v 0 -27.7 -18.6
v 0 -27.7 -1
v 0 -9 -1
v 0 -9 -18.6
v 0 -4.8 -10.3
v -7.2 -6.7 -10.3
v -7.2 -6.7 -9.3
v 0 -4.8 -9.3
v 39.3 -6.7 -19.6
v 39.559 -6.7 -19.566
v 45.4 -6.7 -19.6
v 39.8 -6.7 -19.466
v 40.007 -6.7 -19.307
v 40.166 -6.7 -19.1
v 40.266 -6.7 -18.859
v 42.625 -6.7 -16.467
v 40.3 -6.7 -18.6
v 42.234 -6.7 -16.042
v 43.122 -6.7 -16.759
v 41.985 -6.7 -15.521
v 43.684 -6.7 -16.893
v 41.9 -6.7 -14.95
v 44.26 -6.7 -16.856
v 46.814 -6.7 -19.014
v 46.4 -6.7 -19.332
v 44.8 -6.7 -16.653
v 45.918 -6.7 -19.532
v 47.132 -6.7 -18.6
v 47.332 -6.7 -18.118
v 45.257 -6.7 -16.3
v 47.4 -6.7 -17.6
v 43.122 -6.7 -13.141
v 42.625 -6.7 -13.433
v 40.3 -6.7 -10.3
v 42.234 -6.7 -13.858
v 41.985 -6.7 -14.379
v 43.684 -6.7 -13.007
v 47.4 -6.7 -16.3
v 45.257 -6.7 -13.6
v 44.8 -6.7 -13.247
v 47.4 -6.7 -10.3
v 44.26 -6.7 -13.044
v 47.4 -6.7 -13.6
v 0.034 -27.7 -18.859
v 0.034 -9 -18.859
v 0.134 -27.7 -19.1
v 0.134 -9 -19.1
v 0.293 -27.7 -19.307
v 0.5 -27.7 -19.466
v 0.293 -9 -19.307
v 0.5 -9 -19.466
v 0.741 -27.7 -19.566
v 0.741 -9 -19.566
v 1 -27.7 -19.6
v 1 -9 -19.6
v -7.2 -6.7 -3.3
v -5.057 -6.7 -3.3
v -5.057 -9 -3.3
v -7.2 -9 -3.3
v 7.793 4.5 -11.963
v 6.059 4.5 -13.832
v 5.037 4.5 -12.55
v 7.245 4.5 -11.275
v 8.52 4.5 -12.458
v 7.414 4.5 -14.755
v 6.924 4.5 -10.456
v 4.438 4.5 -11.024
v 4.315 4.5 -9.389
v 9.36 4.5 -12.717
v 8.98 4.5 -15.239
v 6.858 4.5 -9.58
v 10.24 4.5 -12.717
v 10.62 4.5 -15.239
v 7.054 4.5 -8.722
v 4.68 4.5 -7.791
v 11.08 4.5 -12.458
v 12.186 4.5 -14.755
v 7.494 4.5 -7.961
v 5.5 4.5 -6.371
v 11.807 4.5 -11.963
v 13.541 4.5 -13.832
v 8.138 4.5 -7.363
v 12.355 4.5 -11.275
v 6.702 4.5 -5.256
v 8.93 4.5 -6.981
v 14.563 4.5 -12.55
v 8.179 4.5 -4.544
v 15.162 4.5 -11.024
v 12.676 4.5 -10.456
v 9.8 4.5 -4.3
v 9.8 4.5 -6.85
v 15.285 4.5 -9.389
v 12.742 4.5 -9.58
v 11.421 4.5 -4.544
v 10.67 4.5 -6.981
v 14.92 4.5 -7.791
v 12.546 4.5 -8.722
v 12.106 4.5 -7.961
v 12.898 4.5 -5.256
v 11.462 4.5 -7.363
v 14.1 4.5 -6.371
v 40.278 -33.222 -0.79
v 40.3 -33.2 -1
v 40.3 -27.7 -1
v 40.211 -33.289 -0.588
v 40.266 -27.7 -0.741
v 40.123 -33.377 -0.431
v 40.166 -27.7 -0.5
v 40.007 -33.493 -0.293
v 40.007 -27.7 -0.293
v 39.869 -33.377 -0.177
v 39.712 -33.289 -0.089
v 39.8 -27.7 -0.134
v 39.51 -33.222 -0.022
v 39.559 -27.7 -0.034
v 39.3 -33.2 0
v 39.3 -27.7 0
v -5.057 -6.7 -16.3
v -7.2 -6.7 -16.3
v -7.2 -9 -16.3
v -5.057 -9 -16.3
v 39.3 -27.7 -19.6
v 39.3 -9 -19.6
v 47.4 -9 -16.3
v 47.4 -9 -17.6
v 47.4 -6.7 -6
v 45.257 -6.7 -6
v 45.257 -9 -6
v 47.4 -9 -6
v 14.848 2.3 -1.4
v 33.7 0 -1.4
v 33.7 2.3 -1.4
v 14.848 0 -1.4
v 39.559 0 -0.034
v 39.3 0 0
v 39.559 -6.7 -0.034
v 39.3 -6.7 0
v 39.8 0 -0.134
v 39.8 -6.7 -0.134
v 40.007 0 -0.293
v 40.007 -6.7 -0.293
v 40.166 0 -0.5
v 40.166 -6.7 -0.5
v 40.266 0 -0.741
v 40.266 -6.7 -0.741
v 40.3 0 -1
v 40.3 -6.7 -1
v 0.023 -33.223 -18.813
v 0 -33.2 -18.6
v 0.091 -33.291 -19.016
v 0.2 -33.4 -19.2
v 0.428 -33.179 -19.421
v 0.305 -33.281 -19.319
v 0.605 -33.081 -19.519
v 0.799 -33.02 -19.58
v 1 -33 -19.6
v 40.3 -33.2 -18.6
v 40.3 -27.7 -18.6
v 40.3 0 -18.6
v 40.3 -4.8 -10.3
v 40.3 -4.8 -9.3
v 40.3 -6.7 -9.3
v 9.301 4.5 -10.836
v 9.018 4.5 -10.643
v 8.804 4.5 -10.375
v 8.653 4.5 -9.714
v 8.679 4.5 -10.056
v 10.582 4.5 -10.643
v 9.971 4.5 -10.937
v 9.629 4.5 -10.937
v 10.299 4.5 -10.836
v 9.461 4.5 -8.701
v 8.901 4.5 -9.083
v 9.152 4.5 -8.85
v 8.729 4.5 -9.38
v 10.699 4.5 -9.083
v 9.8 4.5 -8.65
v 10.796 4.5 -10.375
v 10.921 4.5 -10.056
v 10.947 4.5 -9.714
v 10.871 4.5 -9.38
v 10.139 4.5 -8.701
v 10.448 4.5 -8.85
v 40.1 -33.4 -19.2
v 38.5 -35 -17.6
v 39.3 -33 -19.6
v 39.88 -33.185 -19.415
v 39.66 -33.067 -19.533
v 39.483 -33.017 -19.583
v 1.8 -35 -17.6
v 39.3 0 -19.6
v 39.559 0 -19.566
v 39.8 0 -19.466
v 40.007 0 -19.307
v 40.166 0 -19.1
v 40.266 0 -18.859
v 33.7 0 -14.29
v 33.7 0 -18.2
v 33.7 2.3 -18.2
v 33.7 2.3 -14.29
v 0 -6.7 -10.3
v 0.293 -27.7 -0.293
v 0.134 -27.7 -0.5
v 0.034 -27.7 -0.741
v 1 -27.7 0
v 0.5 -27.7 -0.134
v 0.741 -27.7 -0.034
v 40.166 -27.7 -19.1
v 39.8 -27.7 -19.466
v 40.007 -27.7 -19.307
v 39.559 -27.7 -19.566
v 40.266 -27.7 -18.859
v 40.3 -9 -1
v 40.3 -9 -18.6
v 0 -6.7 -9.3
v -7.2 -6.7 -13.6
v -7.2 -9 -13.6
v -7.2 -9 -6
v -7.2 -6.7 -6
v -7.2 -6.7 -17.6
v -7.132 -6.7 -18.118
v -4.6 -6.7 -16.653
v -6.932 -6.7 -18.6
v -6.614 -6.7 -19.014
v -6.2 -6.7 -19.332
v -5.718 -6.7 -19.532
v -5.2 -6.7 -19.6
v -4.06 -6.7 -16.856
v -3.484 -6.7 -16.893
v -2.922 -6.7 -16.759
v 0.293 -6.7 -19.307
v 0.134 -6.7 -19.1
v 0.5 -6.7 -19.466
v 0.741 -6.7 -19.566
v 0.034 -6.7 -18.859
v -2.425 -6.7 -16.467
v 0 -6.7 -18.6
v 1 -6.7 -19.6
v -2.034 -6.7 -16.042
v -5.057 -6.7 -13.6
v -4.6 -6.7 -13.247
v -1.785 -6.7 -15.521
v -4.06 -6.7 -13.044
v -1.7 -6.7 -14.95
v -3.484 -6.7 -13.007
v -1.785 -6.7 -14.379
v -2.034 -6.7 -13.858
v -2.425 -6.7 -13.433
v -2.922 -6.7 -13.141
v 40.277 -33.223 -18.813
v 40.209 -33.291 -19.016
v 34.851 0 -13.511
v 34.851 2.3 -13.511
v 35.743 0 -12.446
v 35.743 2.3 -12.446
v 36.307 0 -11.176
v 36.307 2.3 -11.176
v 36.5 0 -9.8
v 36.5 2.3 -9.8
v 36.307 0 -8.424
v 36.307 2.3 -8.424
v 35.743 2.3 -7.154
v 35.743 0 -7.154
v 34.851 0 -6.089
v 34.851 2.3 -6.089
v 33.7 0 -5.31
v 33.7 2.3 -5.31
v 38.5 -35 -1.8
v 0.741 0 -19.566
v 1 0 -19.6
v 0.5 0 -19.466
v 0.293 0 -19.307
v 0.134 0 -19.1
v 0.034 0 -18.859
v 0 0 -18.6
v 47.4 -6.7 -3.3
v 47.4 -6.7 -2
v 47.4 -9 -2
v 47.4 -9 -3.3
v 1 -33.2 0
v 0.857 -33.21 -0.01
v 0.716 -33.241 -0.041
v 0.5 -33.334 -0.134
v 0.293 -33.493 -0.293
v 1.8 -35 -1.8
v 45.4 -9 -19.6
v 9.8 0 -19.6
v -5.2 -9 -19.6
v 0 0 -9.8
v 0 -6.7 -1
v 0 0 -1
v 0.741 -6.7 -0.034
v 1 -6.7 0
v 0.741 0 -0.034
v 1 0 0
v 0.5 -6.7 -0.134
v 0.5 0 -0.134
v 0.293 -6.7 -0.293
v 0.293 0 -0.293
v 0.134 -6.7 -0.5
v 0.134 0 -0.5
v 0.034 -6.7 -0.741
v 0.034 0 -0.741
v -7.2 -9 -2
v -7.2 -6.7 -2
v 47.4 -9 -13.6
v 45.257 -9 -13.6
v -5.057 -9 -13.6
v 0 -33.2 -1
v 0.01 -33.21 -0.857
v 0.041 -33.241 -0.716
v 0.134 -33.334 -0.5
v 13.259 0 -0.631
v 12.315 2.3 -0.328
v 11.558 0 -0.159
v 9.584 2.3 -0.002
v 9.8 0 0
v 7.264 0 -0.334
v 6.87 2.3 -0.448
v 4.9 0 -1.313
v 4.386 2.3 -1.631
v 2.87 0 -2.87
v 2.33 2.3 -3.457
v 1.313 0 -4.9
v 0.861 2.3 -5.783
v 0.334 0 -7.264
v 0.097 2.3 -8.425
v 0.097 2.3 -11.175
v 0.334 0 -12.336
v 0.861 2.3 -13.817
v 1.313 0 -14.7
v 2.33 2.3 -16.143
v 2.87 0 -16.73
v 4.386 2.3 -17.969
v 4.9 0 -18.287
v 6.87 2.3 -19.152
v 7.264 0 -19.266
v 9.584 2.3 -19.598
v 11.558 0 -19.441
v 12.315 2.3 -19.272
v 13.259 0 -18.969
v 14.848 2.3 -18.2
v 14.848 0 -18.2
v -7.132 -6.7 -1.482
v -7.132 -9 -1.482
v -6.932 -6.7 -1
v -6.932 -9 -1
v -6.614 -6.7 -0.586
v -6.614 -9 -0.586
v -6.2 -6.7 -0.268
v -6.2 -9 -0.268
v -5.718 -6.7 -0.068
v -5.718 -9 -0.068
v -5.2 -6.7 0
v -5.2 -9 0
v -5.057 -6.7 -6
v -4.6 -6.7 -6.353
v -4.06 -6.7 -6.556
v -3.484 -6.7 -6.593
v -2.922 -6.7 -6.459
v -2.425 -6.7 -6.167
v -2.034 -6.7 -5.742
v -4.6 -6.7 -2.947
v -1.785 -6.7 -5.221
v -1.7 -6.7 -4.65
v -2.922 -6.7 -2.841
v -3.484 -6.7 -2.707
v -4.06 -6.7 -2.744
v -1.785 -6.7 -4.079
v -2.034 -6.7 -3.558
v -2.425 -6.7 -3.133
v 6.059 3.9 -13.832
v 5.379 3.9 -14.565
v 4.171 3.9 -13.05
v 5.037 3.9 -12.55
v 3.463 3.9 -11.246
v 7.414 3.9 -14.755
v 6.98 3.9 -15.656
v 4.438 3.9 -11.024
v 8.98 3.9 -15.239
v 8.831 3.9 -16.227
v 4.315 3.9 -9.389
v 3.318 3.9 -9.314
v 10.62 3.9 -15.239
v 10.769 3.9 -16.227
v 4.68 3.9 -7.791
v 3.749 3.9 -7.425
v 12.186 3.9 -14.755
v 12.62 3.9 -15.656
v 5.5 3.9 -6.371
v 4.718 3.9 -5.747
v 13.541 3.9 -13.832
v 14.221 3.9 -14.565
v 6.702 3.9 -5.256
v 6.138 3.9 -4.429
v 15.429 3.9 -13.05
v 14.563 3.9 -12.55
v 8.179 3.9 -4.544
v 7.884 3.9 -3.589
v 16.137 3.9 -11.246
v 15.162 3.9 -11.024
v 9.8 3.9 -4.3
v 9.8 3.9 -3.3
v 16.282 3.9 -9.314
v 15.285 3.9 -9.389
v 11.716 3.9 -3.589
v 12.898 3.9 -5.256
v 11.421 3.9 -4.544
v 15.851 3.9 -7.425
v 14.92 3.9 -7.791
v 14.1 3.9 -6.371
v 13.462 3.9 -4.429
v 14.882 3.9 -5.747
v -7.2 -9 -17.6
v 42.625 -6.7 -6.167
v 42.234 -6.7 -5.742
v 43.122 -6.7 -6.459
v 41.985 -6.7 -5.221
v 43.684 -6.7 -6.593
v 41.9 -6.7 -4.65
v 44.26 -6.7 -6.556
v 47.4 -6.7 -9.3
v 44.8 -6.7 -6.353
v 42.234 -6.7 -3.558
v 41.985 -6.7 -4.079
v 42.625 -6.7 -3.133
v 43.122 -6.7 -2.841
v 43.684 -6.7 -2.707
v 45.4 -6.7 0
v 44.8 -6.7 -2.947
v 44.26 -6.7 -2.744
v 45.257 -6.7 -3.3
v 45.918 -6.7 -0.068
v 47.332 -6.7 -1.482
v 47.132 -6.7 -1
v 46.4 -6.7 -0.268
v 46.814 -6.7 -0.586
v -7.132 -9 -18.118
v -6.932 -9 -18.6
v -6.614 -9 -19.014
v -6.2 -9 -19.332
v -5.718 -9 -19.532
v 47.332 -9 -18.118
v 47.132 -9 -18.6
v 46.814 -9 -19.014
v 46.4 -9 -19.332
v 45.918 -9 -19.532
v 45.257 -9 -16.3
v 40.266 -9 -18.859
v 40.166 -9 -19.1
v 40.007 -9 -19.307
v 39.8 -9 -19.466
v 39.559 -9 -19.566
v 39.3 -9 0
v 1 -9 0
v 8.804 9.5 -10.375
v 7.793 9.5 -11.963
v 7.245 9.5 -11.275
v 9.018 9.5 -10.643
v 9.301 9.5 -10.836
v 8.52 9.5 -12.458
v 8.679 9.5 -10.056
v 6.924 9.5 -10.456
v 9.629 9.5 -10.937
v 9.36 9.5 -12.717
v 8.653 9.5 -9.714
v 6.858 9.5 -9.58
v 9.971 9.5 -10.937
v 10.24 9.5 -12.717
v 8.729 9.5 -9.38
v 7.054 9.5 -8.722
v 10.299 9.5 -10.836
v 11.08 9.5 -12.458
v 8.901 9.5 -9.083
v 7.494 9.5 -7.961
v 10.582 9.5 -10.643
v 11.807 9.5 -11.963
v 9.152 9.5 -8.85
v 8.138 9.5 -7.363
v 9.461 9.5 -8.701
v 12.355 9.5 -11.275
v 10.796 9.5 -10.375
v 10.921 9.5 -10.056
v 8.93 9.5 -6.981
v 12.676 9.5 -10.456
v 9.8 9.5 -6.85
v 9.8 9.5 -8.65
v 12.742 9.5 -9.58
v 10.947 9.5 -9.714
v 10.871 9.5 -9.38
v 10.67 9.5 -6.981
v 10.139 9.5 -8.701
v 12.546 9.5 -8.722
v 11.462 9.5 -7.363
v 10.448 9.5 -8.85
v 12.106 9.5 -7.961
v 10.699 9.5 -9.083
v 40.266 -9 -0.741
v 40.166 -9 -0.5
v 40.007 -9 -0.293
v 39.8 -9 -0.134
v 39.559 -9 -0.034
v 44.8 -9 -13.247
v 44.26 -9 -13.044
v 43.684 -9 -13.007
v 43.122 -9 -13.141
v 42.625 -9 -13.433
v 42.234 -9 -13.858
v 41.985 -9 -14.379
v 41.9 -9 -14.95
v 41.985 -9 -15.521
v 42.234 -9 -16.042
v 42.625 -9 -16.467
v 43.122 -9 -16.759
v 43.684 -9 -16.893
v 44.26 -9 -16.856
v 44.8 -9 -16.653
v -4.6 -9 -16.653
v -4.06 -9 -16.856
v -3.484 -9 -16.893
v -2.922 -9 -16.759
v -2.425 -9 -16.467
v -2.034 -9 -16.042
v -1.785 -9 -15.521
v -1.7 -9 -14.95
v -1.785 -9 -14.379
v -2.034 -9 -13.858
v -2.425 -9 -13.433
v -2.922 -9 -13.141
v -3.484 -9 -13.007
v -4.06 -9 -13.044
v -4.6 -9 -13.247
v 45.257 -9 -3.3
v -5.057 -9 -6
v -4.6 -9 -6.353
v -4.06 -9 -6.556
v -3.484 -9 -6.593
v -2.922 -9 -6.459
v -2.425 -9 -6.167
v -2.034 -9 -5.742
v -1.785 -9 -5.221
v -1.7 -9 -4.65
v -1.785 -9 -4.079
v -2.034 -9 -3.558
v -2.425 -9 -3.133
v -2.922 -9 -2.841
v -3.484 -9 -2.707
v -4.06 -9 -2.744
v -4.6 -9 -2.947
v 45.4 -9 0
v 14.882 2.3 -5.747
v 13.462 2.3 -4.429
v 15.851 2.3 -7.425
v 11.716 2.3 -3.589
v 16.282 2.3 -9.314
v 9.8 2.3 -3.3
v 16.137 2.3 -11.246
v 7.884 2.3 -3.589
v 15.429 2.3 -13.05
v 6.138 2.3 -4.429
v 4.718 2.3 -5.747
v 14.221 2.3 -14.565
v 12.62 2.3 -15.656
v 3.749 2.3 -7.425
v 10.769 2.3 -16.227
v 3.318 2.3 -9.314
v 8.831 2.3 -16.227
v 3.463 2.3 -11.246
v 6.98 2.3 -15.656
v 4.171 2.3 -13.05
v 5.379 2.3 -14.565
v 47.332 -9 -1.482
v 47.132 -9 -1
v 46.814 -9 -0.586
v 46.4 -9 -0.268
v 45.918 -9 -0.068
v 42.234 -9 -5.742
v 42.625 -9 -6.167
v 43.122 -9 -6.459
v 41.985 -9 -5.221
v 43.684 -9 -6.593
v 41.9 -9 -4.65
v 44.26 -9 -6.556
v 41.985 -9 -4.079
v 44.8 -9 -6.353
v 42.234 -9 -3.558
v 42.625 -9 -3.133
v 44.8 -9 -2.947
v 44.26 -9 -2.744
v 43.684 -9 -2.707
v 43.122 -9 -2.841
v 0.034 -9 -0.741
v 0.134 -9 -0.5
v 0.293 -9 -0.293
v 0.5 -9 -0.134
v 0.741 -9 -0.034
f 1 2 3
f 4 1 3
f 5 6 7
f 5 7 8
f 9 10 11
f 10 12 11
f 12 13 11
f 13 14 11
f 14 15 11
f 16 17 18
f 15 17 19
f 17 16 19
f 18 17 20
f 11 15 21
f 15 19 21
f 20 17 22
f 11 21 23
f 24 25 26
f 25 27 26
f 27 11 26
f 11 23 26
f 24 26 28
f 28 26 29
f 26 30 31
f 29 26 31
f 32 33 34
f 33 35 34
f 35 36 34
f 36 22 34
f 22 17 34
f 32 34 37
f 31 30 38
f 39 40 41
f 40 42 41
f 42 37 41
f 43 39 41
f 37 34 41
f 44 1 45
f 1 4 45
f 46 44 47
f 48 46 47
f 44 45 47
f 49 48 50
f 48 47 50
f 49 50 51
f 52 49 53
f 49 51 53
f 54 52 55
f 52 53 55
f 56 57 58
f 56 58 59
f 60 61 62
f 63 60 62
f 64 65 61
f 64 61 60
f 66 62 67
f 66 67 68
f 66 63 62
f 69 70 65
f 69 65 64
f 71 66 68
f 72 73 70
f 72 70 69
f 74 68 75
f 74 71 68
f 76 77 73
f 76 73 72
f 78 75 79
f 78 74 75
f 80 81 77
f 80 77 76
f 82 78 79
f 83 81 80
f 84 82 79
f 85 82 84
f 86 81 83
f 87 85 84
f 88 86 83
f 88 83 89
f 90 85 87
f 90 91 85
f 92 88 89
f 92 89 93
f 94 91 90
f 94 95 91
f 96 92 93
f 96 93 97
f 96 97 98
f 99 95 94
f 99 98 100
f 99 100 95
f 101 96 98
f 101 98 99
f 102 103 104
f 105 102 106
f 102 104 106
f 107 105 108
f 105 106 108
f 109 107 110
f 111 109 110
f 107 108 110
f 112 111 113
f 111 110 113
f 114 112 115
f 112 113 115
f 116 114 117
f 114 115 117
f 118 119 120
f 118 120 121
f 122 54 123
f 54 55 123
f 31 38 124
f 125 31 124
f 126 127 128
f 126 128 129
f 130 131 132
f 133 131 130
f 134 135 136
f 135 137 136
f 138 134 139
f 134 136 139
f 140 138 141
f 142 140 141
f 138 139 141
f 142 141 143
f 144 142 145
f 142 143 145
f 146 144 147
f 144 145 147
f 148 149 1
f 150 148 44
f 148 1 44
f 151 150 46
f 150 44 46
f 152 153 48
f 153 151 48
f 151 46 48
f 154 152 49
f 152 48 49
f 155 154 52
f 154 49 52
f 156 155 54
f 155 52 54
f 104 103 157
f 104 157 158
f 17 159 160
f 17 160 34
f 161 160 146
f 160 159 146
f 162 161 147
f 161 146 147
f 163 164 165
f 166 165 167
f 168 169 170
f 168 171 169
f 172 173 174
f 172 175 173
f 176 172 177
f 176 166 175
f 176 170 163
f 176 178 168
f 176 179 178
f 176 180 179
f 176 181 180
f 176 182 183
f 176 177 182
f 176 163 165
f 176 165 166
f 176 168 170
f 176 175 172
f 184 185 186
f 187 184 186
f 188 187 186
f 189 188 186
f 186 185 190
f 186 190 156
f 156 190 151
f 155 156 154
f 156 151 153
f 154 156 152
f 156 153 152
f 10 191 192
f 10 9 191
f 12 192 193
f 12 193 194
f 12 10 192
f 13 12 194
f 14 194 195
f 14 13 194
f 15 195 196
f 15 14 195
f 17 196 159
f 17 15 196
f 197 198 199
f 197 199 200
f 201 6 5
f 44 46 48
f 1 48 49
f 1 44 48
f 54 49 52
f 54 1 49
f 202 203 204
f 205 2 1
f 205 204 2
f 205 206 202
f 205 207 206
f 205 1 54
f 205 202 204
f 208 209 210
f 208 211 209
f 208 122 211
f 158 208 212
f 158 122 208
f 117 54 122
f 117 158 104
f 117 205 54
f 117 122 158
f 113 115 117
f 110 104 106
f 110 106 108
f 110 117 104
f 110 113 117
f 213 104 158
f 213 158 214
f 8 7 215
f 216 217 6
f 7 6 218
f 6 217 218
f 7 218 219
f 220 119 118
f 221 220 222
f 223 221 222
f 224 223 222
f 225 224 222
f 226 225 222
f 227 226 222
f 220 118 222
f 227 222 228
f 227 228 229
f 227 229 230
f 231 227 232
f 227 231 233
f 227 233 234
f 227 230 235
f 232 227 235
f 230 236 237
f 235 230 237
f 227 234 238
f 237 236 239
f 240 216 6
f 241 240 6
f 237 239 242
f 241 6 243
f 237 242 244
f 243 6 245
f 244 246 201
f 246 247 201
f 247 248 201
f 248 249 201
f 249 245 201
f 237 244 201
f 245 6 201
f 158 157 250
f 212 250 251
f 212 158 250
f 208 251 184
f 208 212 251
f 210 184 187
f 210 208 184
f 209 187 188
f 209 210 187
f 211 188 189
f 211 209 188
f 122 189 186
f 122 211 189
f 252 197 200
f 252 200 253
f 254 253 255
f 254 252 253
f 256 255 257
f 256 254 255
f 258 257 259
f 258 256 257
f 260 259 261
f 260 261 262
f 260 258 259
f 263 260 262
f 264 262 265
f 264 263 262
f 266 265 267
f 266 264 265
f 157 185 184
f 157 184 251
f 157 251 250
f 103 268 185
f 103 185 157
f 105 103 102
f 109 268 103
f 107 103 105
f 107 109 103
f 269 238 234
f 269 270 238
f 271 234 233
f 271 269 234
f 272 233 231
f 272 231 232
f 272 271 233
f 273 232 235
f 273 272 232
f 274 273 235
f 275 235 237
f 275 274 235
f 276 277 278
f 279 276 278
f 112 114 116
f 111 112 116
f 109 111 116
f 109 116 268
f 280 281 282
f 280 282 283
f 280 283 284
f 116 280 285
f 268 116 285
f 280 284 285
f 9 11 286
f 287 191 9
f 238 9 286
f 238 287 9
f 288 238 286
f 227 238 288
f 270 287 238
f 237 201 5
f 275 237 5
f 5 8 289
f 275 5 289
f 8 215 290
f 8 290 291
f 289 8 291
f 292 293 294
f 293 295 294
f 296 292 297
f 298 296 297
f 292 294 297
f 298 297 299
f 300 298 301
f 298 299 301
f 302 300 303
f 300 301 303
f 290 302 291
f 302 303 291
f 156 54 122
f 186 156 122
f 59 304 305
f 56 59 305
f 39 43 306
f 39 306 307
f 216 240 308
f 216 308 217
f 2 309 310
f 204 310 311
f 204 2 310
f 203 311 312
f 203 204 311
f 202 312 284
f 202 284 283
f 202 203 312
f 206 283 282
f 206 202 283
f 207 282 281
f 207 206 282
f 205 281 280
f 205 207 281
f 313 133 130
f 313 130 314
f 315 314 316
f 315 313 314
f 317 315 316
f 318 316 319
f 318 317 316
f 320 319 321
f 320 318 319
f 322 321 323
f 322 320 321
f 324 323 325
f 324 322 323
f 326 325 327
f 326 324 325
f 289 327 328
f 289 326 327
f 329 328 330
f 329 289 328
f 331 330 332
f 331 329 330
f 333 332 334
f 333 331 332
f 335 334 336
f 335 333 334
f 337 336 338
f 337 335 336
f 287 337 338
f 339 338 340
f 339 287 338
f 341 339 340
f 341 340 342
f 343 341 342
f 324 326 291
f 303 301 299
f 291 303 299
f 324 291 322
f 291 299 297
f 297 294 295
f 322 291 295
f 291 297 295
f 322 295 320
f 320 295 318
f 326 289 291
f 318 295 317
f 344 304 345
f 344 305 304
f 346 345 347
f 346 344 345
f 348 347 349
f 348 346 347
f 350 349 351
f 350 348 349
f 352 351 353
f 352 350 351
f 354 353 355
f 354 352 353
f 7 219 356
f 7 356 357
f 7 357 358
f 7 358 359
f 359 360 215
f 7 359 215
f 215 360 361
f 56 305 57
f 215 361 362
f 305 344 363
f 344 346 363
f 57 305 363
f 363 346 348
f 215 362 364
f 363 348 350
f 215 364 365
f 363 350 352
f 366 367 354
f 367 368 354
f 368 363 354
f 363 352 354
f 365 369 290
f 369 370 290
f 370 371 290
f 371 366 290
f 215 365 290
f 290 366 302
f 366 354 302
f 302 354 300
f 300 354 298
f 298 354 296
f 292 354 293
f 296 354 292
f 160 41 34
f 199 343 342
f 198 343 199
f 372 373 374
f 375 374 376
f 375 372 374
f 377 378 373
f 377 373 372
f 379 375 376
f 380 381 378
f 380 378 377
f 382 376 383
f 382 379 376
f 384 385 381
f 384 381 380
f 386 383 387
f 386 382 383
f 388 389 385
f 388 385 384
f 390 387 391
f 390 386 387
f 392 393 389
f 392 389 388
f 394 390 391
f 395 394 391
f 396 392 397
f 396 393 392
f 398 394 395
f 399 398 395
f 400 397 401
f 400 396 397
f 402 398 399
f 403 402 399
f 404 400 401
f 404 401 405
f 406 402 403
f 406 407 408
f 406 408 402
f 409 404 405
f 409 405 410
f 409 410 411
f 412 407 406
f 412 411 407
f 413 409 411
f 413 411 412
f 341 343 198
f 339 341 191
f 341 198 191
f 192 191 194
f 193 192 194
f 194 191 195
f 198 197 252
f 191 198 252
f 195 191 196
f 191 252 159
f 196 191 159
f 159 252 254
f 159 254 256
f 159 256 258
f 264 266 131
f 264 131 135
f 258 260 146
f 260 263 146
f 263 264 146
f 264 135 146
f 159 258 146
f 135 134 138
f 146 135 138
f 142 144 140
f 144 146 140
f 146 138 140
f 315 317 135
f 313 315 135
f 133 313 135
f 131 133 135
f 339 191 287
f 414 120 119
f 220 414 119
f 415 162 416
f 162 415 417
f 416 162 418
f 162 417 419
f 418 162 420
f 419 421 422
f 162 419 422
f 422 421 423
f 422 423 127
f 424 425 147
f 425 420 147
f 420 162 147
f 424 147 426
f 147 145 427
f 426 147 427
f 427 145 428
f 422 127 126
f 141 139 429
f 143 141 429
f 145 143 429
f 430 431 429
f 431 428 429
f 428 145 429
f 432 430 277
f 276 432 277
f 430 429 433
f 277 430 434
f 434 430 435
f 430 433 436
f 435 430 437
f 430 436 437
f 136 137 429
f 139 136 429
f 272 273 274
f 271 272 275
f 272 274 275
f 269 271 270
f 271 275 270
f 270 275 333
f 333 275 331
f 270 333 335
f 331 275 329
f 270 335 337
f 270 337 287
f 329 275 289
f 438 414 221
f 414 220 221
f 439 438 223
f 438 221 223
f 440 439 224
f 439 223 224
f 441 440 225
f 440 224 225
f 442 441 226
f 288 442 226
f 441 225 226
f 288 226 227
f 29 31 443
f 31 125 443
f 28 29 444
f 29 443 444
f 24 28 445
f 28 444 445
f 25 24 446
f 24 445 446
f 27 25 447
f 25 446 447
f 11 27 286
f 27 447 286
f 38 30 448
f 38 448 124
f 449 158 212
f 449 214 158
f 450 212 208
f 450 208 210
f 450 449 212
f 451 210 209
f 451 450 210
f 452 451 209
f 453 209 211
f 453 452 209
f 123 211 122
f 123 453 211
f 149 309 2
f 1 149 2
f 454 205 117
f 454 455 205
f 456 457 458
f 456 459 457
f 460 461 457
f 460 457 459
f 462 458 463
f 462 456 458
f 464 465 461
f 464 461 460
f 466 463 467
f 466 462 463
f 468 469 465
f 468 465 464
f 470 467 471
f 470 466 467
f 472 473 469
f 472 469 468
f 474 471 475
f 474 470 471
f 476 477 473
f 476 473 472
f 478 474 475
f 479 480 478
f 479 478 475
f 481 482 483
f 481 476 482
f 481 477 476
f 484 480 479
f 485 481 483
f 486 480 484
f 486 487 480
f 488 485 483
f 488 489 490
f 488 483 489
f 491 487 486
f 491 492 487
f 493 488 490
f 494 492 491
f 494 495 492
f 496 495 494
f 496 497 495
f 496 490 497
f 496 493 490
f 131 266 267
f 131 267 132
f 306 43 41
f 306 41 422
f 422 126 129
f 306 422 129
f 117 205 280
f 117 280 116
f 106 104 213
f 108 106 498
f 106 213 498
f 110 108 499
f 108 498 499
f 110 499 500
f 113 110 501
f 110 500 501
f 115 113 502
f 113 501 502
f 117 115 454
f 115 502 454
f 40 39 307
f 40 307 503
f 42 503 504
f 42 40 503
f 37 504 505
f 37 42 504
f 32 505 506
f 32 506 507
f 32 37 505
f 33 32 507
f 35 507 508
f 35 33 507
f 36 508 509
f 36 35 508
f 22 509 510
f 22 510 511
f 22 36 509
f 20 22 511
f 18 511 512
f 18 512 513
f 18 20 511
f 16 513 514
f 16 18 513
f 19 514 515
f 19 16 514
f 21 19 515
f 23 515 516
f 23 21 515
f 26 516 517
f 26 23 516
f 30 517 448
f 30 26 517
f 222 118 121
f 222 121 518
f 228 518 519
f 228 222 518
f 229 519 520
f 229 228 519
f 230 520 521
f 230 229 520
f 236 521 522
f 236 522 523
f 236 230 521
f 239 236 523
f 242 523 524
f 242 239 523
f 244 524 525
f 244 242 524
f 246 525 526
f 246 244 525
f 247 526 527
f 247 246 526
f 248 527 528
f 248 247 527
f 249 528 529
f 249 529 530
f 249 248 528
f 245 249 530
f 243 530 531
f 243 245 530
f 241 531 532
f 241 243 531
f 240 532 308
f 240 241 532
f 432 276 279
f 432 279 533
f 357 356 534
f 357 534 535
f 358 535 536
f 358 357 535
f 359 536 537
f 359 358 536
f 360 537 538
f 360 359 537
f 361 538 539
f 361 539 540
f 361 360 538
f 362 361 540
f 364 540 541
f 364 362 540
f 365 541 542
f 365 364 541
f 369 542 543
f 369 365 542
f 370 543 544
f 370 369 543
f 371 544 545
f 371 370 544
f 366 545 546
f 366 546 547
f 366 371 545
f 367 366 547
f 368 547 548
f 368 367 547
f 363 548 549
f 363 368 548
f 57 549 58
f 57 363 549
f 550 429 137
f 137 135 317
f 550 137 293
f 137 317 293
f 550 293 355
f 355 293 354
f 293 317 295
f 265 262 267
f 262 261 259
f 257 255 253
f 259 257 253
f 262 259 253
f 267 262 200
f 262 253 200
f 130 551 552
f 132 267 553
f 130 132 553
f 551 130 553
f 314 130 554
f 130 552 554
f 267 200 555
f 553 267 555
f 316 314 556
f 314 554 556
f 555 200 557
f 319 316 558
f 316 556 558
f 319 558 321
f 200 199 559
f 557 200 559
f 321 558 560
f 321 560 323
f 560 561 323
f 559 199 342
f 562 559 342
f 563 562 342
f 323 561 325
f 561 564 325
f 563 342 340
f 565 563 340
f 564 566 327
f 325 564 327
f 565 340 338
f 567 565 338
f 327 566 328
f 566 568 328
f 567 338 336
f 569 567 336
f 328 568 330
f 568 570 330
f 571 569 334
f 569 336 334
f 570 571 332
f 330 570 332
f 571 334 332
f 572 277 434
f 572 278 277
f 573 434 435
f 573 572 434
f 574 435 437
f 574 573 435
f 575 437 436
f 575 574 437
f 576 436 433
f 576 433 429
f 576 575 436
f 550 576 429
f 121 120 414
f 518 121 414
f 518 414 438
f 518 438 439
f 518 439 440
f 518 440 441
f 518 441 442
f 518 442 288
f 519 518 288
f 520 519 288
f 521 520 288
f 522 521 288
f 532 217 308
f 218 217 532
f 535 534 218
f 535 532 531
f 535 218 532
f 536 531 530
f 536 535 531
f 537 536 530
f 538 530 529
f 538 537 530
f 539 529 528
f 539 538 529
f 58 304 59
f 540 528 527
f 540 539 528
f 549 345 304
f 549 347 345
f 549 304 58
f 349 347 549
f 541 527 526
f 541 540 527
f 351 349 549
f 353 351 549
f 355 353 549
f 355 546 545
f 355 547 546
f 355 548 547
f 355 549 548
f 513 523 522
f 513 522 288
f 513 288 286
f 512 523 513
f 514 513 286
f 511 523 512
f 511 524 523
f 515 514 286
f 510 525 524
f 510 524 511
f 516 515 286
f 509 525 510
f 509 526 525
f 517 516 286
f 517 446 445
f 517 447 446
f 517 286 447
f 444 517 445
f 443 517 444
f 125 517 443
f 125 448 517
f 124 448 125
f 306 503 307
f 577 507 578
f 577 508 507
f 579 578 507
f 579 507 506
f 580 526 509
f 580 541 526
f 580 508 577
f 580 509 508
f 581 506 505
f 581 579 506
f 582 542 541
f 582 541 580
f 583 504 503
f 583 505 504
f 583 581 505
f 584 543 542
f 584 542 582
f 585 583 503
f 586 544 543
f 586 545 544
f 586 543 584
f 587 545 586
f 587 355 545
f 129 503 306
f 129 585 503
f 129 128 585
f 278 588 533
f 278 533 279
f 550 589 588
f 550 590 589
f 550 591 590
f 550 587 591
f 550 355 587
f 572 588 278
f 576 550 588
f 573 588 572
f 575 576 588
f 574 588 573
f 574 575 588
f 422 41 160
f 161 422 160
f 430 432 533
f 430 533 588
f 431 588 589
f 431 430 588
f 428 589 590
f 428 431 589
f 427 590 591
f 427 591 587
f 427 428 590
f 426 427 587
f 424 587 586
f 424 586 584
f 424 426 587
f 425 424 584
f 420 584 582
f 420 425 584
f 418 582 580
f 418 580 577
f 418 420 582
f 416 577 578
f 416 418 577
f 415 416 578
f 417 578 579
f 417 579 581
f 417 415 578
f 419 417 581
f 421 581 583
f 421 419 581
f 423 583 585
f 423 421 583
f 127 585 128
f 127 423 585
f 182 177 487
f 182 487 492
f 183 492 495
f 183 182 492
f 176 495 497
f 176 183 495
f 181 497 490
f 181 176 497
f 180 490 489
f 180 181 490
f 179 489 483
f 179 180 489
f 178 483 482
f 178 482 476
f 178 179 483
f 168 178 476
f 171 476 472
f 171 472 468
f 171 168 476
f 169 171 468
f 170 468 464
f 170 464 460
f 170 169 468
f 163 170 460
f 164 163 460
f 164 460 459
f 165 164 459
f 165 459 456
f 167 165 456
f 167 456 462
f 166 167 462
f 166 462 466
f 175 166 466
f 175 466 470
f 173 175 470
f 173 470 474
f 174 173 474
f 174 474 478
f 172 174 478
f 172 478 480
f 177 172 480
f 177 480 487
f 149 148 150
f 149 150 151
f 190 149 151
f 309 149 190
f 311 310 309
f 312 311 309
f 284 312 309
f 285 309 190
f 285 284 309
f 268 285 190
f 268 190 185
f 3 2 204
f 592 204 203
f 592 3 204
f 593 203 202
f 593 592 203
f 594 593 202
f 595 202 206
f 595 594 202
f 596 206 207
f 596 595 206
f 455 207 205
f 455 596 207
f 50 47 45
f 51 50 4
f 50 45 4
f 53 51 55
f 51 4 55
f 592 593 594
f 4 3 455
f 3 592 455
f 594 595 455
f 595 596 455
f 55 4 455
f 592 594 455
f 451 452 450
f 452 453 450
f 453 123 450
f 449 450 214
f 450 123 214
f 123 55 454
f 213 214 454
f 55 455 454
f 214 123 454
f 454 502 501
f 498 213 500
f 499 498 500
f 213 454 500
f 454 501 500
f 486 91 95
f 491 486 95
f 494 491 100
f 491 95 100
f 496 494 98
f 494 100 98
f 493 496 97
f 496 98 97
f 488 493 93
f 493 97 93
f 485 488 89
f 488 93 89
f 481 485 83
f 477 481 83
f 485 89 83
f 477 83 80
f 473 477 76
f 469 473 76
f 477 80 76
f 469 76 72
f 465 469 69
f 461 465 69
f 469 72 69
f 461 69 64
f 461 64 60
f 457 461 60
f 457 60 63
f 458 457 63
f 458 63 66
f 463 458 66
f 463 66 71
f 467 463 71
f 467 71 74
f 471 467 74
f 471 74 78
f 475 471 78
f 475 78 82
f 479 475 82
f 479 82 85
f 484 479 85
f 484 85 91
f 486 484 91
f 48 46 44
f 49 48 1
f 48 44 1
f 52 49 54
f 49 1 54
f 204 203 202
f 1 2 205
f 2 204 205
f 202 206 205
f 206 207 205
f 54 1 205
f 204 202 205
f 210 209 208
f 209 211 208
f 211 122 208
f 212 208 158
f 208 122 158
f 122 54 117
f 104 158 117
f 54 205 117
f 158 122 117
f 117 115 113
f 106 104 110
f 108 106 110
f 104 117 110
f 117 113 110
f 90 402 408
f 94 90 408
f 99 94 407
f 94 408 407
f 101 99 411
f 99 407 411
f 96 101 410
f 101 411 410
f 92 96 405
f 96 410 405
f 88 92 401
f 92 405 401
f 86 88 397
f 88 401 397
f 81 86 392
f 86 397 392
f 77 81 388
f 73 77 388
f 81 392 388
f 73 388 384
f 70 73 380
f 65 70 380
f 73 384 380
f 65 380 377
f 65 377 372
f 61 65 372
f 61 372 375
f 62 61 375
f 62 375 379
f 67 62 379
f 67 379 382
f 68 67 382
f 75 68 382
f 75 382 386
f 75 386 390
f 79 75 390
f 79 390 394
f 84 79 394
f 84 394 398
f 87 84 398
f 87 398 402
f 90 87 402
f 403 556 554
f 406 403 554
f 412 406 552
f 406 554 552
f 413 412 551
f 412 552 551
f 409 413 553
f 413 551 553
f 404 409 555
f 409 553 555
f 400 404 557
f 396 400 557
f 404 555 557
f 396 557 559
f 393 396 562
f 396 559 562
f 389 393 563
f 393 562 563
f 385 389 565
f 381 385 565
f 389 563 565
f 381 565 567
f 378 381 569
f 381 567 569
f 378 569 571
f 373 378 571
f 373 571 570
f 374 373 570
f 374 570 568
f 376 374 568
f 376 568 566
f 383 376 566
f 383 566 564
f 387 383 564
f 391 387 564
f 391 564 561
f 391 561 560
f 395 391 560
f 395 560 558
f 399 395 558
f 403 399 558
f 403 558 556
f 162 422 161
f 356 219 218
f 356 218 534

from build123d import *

# Parameters (mm, degrees)
SALIENTE_EXTRUIR1_DEPTH = 19.6
CROQUIS1_3_W            = 40.3
CROQUIS1_3_H            = 18.7
SALIENTE_EXTRUIR2_DEPTH = 19.6
CROQUIS1_4_W            = 40.3
CROQUIS1_4_H            = 7.3
SALIENTE_EXTRUIR3_DEPTH = 19.6
REDONDEO1_R             = 2
REDONDEO2_R             = 1
REDONDEO3_R             = 1
REDONDEO4_R             = 1
CHAFL_N1_SIZE           = 2
CHAFL_N2_SIZE           = 1.8
CHAFL_N3_SIZE           = 1.8
CROQUIS2_R              = 6.5
SALIENTE_EXTRUIR4_DEPTH = 2.3
CROQUIS2_3_R            = 6.5
SALIENTE_EXTRUIR5_DEPTH = 3.9
CROQUIS2_5_R            = 5.5
SALIENTE_EXTRUIR6_DEPTH = 4.5
CROQUIS2_6_R            = 2.95
CROQUIS2_6_R_2          = 1.15
SALIENTE_EXTRUIR7_DEPTH = 9.5
CORTAR_EXTRUIR1_DEPTH   = 2.3
NERVIO21_REACH          = 61.731
CROQUIS4_WALL_W         = 128.81195782
CROQUIS4_WALL_H         = 1
NERVIO24_REACH          = 61.731
CROQUIS5_WALL_W         = 128.908603566
CROQUIS5_WALL_H         = 1


with BuildPart() as part:
    # Croquis1 → Saliente-Extruir1 (new body)
    with BuildSketch(Plane.XY):
        Polygon((40.3, -9), (0, -9), (-7.2, -9), (-7.2, -6.7), (0, -6.7), (0, 0), (40.3, 0), (40.3, -6.7), (47.4, -6.7), (47.4, -9), align=None)
    extrude(amount=-SALIENTE_EXTRUIR1_DEPTH)

    # Redondeo1
    redondeo1_edges = [part.edges().sort_by_distance(p)[0] for p in [
        (-7.2, -7.85, 0),
        (47.4, -7.85, -19.6),
        (47.4, -7.85, 0),
        (-7.2, -7.85, -19.6),
    ]]
    fillet(redondeo1_edges, radius=REDONDEO1_R)

    # Redondeo4
    redondeo4_edges = [part.edges().sort_by_distance(p)[0] for p in [
        (0, -3.35, 0),
        (40.3, -3.35, 0),
        (40.3, -3.35, -19.6),
        (0, -3.35, -19.6),
    ]]
    fillet(redondeo4_edges, radius=REDONDEO4_R)

    # Croquis2 → Saliente-Extruir4 (add)
    with BuildSketch(Plane(origin=(0, 0, 0), x_dir=(1, 0, 0), z_dir=(0, 1, 0))):
        with BuildLine():
            Line((33.7, 5.310011136), (33.7, 1.4))
            Line((33.7, 1.4), (14.847771786, 1.4))
            ThreePointArc((14.847771786, 1.4), (0, 9.8), (14.847771786, 18.2))
            Line((14.847771786, 18.2), (33.7, 18.2))
            Line((33.7, 18.2), (33.7, 14.289988864))
            ThreePointArc((33.7, 14.289988864), (36.5, 9.8), (33.7, 5.310011136))
        make_face()
        with Locations(Location((9.8, 9.8, 0), (0, 0, 270))):
            Circle(CROQUIS2_R, mode=Mode.SUBTRACT)
    extrude(amount=SALIENTE_EXTRUIR4_DEPTH)

    # Croquis2<3> → Saliente-Extruir5 (add)
    with BuildSketch(Plane(origin=(0, 0, 0), x_dir=(1, 0, 0), z_dir=(0, 1, 0))):
        with Locations(Location((9.8, 9.8, 0), (0, 0, 270))):
            Circle(CROQUIS2_3_R)
    extrude(amount=SALIENTE_EXTRUIR5_DEPTH)

    # Croquis2<5> → Saliente-Extruir6 (add)
    with BuildSketch(Plane(origin=(0, 0, 0), x_dir=(1, 0, 0), z_dir=(0, 1, 0))):
        with Locations(Location((9.8, 9.8, 0), (0, 0, 270))):
            Circle(CROQUIS2_5_R)
    extrude(amount=SALIENTE_EXTRUIR6_DEPTH)

    # Croquis2<6> → Saliente-Extruir7 (add)
    with BuildSketch(Plane(origin=(0, 0, 0), x_dir=(1, 0, 0), z_dir=(0, 1, 0))):
        with Locations(Location((9.8, 9.8, 0), (0, 0, 270))):
            Circle(CROQUIS2_6_R)
        with Locations(Location((9.8, 9.8, 0), (0, 0, 270))):
            Circle(CROQUIS2_6_R_2, mode=Mode.SUBTRACT)
    extrude(amount=SALIENTE_EXTRUIR7_DEPTH)

    # Croquis3 → Cortar-Extruir1 (cut)
    with BuildSketch(Plane(origin=(0, -6.7, 0), x_dir=(1, 0, 0), z_dir=(0, 1, 0))):
        with BuildLine():
            Line((47.4, 16.3), (47.4, 13.6))
            Line((47.4, 13.6), (45.257124728, 13.6))
            ThreePointArc((45.257124728, 13.6), (41.9, 14.95), (45.257124728, 16.3))
            Line((45.257124728, 16.3), (47.4, 16.3))
        make_face()
        with BuildLine():
            Line((47.4, 3.3), (45.257124728, 3.3))
            ThreePointArc((45.257124728, 3.3), (41.9, 4.65), (45.257124728, 6))
            Line((45.257124728, 6), (47.4, 6))
            Line((47.4, 6), (47.4, 3.3))
        make_face()
        with BuildLine():
            Line((-7.2, 3.3), (-7.2, 6))
            Line((-7.2, 6), (-5.057124728, 6))
            ThreePointArc((-5.057124728, 6), (-1.7, 4.65), (-5.057124728, 3.3))
            Line((-5.057124728, 3.3), (-7.2, 3.3))
        make_face()
        with BuildLine():
            Line((-7.2, 16.3), (-5.057124728, 16.3))
            ThreePointArc((-5.057124728, 16.3), (-1.7, 14.95), (-5.057124728, 13.6))
            Line((-5.057124728, 13.6), (-7.2, 13.6))
            Line((-7.2, 13.6), (-7.2, 16.3))
        make_face()
    extrude(amount=-CORTAR_EXTRUIR1_DEPTH, mode=Mode.SUBTRACT)

    # Croquis4 wall → Nervio21 (add, up to next)
    with BuildSketch(Plane(origin=(43.85, -5.75, -9.8), x_dir=(-0.966008746817, 0.258509382951, 0), z_dir=(-0.258509382951, -0.966008746817, 0)), mode=Mode.PRIVATE) as nervio21_sk1:
        Rectangle(CROQUIS4_WALL_W, CROQUIS4_WALL_H)
    nervio21_tool1 = extrude(nervio21_sk1.sketch, amount=NERVIO21_REACH, mode=Mode.PRIVATE) - part.part
    add(nervio21_tool1.solids().sort_by_distance((43.85, -5.75, -9.8))[0])

    # Croquis5 wall → Nervio24 (add, up to next)
    with BuildSketch(Plane(origin=(-3.6, -5.75, -9.8), x_dir=(0.966900358349, 0.255154261231, 0), z_dir=(-0.255154261231, 0.966900358349, 0)), mode=Mode.PRIVATE) as nervio24_sk1:
        Rectangle(CROQUIS5_WALL_W, CROQUIS5_WALL_H)
    nervio24_tool1 = extrude(nervio24_sk1.sketch, amount=-NERVIO24_REACH, mode=Mode.PRIVATE) - part.part
    add(nervio24_tool1.solids().sort_by_distance((-3.6, -5.75, -9.8))[0])


with BuildPart() as body_2:
    # Croquis1<3> → Saliente-Extruir2 (new body)
    with BuildSketch(Plane.XY):
        with Locations((20.15, -18.35)):
            Rectangle(CROQUIS1_3_W, CROQUIS1_3_H)
    extrude(amount=-SALIENTE_EXTRUIR2_DEPTH)

    # Redondeo2
    redondeo2_edges = [body_2.edges().sort_by_distance(p)[0] for p in [
        (0, -18.35, -19.6),
        (0, -18.35, 0),
        (40.3, -18.35, 0),
        (40.3, -18.35, -19.6),
    ]]
    fillet(redondeo2_edges, radius=REDONDEO2_R)


with BuildPart() as body_3:
    # Croquis1<4> → Saliente-Extruir3 (new body)
    with BuildSketch(Plane.XY):
        with Locations((20.15, -31.35)):
            Rectangle(CROQUIS1_4_W, CROQUIS1_4_H)
    extrude(amount=-SALIENTE_EXTRUIR3_DEPTH)

    # Redondeo3
    redondeo3_edges = [body_3.edges().sort_by_distance(p)[0] for p in [
        (0, -31.35, -19.6),
        (40.3, -31.35, -19.6),
        (0, -31.35, 0),
        (40.3, -31.35, 0),
    ]]
    fillet(redondeo3_edges, radius=REDONDEO3_R)

    # Chaflán1
    # the kernel refuses this chamfer: 2 mm, written as the material it takes off along each edge
    with BuildSketch(Plane(origin=(-4.143365976, -35, -19.6), x_dir=(0, -0.027495876610585647, 0.9996219169112968), z_dir=(1, 0, 0))) as chafl_n1_piece_1:
        Polygon((CHAFL_N1_SIZE * 0.999621916911, -CHAFL_N1_SIZE * 0.0274958766106), (-CHAFL_N1_SIZE * 0.0274958766106, -CHAFL_N1_SIZE * 0.999621916911), (0, 0), align=None)
    extrude(amount=48.586731952, mode=Mode.SUBTRACT)

    # Chaflán2
    # the kernel refuses this chamfer: 1.8 mm, written as the material it takes off along each edge
    with BuildSketch(Plane(origin=(0, -35, 3.629029378), x_dir=(-0.02749587661058661, 0.9996219169112966, 0), z_dir=(0, 0, -1))) as chafl_n2_piece_1:
        Polygon((CHAFL_N2_SIZE * 0.999621916911, CHAFL_N2_SIZE * 0.0274958766106), (-CHAFL_N2_SIZE * 0.0274958766106, CHAFL_N2_SIZE * 0.999621916911), (0, 0), align=None)
    extrude(amount=25.858058757, mode=Mode.SUBTRACT)

    # Chaflán3
    # the kernel refuses this chamfer: 1.8 mm, written as the material it takes off along each edge
    with BuildSketch(Plane(origin=(40.3, -35, 3.629029378), x_dir=(-0.9996219169112969, -0.02749587661058457, 0), z_dir=(0, 0, -1))) as chafl_n3_piece_1:
        Polygon((CHAFL_N3_SIZE * 0.999621916911, CHAFL_N3_SIZE * 0.0274958766106), (-CHAFL_N3_SIZE * 0.0274958766106, CHAFL_N3_SIZE * 0.999621916911), (0, 0), align=None)
    extrude(amount=25.858058757, mode=Mode.SUBTRACT)
    with BuildSketch(Plane(origin=(-2.829029378, -35, 0), x_dir=(0, 0.9996219169112966, 0.02749587661058649), z_dir=(1, 0, 0))) as chafl_n3_piece_2:
        Polygon((CHAFL_N3_SIZE * 0.999621916911, -CHAFL_N3_SIZE * 0.0274958766106), (-CHAFL_N3_SIZE * 0.0274958766106, -CHAFL_N3_SIZE * 0.999621916911), (0, 0), align=None)
    extrude(amount=46.758058757, mode=Mode.SUBTRACT)


solid = Compound([part.part, body_2.part, body_3.part])
